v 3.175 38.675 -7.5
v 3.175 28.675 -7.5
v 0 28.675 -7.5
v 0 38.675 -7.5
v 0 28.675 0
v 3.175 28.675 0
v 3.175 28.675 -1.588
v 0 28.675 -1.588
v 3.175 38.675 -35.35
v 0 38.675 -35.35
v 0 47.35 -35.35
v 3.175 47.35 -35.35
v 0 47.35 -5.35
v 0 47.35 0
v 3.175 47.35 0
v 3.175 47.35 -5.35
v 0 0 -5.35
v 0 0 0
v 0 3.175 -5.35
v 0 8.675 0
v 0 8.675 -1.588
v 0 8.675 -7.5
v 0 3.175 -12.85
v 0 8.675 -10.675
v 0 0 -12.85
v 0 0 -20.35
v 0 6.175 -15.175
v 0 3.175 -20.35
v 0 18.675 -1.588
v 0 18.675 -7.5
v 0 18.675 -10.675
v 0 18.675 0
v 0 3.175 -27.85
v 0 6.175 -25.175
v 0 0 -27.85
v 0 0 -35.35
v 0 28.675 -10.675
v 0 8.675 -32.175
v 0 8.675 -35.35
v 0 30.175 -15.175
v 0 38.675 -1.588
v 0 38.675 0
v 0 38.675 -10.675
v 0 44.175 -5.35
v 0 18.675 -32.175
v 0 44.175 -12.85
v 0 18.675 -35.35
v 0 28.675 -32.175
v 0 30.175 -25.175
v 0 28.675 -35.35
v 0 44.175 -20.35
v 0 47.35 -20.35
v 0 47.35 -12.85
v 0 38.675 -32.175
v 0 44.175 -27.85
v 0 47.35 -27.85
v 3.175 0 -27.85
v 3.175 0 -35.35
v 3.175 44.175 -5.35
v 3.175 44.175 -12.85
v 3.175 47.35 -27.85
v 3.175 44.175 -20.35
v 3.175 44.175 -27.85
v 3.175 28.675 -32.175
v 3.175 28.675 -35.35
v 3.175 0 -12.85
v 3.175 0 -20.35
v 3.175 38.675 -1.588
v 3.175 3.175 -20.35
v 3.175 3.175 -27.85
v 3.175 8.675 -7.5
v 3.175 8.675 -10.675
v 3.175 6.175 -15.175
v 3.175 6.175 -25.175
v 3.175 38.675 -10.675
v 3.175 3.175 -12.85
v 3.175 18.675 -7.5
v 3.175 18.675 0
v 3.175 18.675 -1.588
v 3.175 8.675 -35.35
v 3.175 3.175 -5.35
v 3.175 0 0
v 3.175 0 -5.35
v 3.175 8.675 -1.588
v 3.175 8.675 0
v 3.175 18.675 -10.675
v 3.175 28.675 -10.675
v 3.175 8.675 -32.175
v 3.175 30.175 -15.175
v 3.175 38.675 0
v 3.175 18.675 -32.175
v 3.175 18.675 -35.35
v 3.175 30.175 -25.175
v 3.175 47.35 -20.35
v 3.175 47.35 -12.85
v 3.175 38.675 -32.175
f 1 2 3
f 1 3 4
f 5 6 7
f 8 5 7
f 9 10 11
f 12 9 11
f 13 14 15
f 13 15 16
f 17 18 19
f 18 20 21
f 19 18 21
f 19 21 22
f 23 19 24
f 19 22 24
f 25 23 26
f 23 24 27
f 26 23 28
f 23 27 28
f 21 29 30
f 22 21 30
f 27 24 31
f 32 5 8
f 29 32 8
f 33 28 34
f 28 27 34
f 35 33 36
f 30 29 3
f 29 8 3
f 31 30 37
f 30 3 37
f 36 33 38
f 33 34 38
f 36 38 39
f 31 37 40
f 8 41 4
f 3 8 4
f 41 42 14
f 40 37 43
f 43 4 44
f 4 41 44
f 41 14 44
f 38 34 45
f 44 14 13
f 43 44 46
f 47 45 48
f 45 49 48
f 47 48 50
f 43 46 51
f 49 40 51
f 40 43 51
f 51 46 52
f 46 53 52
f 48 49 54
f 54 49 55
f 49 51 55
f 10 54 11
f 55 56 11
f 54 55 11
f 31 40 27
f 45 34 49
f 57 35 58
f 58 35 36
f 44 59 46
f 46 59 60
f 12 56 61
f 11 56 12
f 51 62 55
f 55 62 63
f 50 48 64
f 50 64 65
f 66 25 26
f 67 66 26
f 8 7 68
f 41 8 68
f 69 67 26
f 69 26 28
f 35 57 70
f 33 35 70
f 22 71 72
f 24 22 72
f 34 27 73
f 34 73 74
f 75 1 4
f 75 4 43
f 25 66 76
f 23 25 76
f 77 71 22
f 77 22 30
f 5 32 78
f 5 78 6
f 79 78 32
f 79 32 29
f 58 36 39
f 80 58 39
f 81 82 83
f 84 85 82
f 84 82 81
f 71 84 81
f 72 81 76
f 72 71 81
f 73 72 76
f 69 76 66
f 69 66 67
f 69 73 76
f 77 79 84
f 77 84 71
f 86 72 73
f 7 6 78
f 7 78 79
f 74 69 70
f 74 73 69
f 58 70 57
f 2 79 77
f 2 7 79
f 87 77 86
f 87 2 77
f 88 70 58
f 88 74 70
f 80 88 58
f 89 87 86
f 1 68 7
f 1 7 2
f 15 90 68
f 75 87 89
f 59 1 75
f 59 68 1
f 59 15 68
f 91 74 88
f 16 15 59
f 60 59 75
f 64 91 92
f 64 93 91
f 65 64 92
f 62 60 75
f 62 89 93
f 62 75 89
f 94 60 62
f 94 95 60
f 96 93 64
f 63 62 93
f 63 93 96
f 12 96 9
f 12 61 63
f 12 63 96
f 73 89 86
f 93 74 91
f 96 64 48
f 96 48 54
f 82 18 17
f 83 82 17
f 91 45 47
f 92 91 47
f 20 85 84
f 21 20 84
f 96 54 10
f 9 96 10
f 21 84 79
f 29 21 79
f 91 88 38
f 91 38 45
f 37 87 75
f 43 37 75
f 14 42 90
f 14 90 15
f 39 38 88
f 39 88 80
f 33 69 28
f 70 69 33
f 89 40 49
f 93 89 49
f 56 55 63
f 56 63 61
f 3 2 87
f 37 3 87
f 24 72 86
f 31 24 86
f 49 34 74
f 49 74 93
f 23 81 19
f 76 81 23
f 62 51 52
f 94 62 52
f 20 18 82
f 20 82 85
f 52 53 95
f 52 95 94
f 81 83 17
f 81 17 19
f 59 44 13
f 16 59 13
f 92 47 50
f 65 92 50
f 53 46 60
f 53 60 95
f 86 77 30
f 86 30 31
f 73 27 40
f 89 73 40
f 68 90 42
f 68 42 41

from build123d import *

# Parameters (mm, degrees)
SKETCH1_W           = 35.35
SKETCH1_H           = 47.35
SKETCH1_W_2         = 10
SKETCH1_H_2         = 24
BOSS_EXTRUDE1_DEPTH = 3.175
SKETCH2_W           = 3.175
SKETCH2_H           = 10
SKETCH2_W_2         = 1.5875
SKETCH2_W_3         = 7.5
SKETCH2_H_2         = 3.175
CUT_EXTRUDE1_DEPTH  = 4.175


with BuildPart() as part:
    # Sketch1 → Boss-Extrude1 (new body)
    with BuildSketch(Plane(origin=(0, 0, 0), x_dir=(0, 0, -1), z_dir=(1, 0, 0))):
        with Locations((17.675, 23.675)):
            Rectangle(SKETCH1_W, SKETCH1_H)
        with Locations((20.175, 18.175)):
            Rectangle(SKETCH1_W_2, SKETCH1_H_2, mode=Mode.SUBTRACT)
    extrude(amount=BOSS_EXTRUDE1_DEPTH)

    # Sketch2 → Cut-Extrude1 (cut, through all)
    with BuildSketch(Plane(origin=(3.175, 0, 0), x_dir=(0, 0, -1), z_dir=(1, 0, 0))):
        with Locations((33.7625, 33.675)):
            Rectangle(SKETCH2_W, SKETCH2_H)
        with Locations((33.7625, 13.675)):
            Rectangle(SKETCH2_W, SKETCH2_H)
        with Locations((9.0875, 13.675)):
            Rectangle(SKETCH2_W, SKETCH2_H)
        with Locations((9.0875, 33.675)):
            Rectangle(SKETCH2_W, SKETCH2_H)
        with Locations((0.79375, 33.675)):
            Rectangle(SKETCH2_W_2, SKETCH2_H)
        with Locations((0.79375, 13.675)):
            Rectangle(SKETCH2_W_2, SKETCH2_H)
        with Locations((24.1, 45.7625)):
            Rectangle(SKETCH2_W_3, SKETCH2_H_2)
        with Locations((9.1, 45.7625)):
            Rectangle(SKETCH2_W_3, SKETCH2_H_2)
        with Locations((9.1, 1.5875)):
            Rectangle(SKETCH2_W_3, SKETCH2_H_2)
        with Locations((24.1, 1.5875)):
            Rectangle(SKETCH2_W_3, SKETCH2_H_2)
    extrude(amount=-CUT_EXTRUDE1_DEPTH, mode=Mode.SUBTRACT)


solid = part.part
